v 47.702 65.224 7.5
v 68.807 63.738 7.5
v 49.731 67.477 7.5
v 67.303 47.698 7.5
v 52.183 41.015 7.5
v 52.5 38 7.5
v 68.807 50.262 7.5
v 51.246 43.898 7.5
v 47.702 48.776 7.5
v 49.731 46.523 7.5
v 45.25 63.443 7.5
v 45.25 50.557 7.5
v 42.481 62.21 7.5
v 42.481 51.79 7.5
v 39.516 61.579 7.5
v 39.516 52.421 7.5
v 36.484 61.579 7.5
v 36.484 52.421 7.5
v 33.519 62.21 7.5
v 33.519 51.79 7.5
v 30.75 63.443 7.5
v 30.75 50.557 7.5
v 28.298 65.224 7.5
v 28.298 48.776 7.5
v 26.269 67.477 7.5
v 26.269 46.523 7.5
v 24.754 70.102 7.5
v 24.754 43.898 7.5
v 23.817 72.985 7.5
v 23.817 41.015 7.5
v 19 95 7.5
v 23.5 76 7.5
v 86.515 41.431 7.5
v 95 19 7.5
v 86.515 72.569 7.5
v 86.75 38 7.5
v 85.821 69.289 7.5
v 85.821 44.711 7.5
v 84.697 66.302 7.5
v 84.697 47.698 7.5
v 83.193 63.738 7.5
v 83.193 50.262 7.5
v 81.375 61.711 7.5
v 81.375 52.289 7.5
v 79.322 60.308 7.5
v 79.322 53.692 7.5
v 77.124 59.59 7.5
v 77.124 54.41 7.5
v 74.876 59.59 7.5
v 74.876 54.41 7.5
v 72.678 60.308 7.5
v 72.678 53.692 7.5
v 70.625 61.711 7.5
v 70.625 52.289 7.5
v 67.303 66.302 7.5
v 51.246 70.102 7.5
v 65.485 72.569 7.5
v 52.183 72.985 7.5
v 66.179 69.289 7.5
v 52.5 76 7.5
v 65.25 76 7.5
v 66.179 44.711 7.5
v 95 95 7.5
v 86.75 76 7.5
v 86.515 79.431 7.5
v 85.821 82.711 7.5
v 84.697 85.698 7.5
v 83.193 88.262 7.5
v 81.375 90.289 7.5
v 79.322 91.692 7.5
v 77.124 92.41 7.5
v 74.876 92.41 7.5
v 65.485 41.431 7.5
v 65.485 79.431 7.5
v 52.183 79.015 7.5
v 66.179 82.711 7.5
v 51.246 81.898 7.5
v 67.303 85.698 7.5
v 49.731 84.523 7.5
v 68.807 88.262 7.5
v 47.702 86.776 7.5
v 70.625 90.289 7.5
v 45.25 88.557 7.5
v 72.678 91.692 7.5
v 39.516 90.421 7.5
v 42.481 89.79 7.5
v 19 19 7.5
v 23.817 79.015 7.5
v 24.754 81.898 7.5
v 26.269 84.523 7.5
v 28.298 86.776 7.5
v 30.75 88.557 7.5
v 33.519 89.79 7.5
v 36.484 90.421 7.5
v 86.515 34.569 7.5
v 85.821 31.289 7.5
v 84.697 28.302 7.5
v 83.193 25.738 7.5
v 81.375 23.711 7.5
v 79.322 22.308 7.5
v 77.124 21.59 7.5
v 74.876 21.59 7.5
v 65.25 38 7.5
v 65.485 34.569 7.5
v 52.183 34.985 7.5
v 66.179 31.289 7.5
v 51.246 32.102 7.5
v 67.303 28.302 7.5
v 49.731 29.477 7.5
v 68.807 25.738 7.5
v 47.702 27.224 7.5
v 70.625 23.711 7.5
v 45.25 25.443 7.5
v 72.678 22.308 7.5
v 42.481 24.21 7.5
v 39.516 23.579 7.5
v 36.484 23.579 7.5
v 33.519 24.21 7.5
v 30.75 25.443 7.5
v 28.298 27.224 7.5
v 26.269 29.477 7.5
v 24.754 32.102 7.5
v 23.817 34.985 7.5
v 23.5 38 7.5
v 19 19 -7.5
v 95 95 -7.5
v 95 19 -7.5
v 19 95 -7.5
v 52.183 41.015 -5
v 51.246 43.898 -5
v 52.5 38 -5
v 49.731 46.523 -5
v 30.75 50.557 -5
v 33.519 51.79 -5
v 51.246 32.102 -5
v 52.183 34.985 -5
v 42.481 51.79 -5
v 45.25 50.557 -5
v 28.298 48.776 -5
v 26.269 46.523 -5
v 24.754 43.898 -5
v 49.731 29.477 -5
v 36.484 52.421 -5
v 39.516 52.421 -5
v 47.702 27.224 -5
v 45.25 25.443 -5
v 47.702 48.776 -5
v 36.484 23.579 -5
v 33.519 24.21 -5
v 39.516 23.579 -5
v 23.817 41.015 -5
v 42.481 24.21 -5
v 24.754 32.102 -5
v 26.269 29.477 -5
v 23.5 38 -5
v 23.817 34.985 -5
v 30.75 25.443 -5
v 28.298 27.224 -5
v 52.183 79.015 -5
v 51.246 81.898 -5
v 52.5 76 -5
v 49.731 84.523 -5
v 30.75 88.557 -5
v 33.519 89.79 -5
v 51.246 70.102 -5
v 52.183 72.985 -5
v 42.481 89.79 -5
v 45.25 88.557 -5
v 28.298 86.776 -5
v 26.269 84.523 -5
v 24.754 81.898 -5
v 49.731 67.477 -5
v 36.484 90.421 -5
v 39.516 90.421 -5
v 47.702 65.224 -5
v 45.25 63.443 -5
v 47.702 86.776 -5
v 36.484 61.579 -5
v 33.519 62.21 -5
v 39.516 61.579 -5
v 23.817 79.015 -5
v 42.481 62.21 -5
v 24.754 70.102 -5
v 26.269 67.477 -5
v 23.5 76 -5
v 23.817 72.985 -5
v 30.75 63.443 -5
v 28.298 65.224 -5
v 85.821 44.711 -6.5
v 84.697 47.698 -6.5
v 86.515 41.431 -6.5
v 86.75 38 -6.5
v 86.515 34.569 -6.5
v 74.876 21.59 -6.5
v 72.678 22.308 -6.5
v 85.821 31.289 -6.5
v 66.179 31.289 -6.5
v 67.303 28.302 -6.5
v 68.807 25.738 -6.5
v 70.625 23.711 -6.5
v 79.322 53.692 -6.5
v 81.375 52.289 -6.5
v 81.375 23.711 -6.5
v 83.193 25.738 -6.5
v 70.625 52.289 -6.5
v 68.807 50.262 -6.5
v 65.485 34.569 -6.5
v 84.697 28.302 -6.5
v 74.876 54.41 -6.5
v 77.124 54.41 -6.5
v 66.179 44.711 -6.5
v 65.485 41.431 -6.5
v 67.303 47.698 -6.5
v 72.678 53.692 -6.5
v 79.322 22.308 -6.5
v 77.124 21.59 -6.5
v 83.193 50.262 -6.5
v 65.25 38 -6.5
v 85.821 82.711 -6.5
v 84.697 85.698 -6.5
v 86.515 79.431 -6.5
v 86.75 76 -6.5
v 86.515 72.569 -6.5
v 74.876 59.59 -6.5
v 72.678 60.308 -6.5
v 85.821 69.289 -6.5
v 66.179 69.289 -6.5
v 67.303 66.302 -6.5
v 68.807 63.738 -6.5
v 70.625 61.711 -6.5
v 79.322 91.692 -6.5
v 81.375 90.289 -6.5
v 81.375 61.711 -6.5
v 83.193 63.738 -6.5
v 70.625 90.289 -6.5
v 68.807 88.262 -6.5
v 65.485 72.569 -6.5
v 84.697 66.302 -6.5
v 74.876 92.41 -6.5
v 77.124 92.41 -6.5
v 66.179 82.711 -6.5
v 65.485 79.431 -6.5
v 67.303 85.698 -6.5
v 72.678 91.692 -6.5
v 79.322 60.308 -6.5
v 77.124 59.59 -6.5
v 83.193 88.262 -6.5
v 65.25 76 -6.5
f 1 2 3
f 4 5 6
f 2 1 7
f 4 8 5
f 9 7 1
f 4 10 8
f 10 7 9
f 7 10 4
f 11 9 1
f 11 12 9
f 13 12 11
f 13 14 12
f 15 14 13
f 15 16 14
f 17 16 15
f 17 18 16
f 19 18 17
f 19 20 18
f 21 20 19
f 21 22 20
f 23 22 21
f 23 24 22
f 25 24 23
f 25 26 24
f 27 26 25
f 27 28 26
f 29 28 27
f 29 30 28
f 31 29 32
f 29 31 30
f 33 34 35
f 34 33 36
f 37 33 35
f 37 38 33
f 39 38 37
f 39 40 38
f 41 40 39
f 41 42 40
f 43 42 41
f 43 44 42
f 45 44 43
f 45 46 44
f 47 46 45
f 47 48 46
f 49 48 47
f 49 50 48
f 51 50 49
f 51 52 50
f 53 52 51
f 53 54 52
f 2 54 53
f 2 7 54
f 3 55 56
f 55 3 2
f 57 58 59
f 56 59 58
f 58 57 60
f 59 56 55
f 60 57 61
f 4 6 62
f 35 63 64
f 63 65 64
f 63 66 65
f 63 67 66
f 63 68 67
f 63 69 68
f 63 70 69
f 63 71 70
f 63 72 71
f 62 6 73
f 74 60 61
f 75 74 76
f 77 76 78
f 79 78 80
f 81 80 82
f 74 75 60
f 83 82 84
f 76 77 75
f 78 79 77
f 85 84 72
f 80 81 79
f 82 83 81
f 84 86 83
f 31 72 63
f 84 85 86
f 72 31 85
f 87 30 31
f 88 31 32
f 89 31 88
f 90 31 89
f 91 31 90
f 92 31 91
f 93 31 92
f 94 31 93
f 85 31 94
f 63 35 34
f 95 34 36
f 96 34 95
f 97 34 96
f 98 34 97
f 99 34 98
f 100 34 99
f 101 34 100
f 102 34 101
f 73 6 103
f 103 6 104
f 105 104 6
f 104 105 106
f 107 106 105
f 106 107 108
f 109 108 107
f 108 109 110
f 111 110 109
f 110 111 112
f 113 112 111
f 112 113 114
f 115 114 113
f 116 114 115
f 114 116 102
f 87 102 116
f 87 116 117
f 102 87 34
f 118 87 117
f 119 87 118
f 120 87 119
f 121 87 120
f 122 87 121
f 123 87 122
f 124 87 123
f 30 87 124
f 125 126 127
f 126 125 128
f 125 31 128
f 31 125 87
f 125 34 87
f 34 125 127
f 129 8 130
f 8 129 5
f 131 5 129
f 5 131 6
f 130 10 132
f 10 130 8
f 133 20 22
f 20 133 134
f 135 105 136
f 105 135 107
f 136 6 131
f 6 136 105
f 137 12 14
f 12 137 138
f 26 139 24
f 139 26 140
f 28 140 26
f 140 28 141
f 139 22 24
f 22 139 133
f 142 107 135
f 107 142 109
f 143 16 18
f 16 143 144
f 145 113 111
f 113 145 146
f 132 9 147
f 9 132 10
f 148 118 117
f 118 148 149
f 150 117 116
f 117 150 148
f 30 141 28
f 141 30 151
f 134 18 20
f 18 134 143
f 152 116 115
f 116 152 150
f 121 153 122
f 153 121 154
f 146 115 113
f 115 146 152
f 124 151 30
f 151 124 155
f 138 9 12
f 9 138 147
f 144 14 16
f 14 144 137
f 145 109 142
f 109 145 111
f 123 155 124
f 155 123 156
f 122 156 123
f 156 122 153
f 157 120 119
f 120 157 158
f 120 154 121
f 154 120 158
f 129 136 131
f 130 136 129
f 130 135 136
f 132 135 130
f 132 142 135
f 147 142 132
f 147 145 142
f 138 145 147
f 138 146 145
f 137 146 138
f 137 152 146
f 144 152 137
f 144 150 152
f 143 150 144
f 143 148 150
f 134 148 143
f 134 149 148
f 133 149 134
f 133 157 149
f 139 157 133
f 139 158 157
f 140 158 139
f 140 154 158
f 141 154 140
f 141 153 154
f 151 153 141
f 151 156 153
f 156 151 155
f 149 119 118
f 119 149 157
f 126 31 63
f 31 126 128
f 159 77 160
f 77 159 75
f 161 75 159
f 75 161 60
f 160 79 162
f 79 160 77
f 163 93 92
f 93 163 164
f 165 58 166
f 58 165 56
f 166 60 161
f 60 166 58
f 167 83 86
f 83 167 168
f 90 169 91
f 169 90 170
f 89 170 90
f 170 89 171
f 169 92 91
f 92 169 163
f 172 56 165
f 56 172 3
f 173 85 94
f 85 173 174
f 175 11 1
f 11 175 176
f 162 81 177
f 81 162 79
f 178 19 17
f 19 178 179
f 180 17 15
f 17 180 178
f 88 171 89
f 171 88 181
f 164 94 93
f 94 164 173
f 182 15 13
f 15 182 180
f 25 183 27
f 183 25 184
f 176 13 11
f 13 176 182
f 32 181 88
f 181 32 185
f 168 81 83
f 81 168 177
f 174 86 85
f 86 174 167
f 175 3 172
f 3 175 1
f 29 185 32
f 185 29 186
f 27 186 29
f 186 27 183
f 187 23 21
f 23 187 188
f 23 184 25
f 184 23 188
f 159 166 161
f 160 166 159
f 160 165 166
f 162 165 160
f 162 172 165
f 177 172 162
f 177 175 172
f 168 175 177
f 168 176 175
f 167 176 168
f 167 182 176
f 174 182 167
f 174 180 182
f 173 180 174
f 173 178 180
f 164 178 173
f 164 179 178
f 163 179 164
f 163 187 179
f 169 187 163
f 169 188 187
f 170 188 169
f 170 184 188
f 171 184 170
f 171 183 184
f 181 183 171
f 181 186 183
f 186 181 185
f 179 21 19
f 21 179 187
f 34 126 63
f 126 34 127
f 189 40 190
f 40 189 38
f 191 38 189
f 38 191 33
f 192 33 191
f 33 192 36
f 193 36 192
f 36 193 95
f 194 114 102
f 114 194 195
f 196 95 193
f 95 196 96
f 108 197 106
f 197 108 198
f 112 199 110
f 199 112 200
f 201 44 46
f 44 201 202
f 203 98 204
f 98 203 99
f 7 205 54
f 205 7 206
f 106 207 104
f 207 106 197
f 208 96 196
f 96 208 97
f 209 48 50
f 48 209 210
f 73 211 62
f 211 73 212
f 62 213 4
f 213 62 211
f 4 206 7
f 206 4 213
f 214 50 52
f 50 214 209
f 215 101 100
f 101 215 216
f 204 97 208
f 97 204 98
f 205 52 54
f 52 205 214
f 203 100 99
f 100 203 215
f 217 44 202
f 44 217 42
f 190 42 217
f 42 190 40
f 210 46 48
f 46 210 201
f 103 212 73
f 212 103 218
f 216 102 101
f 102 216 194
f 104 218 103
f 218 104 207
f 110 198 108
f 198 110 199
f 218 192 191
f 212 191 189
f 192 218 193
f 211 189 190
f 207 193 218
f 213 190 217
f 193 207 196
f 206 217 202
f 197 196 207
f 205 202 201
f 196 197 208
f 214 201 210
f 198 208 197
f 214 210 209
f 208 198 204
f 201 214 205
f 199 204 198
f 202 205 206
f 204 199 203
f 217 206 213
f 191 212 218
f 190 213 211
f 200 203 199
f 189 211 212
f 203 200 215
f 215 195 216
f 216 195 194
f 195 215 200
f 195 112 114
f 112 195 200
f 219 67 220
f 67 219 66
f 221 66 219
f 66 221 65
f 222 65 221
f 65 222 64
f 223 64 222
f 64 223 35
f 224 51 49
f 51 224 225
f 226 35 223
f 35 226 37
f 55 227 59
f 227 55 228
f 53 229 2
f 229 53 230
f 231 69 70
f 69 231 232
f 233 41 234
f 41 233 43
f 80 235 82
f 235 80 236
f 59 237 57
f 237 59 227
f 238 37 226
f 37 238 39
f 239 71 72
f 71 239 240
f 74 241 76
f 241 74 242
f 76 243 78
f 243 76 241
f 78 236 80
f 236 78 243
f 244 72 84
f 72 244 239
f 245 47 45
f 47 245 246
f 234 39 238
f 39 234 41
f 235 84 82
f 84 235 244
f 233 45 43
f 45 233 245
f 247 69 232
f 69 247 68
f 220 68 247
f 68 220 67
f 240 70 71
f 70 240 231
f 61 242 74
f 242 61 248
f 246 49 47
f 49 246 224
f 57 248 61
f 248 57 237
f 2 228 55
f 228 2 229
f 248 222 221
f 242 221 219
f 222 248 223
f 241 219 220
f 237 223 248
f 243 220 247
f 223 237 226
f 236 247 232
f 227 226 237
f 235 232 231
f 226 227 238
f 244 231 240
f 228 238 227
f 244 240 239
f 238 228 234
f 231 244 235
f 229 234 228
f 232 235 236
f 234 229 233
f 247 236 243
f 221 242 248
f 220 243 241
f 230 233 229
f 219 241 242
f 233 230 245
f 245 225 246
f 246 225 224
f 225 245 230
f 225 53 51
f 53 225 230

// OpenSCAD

itens_per_line = 2;
z_size = 15;
colorama_lines = [2];
risque_lines   = [1];
num_x = len(colorama_lines) + len(risque_lines);

for(x = [1 : 1 :num_x])
{
    for( y = [1 : 1 : itens_per_line])
    {     
        for ( z = [0 : 1 : len(colorama_lines)])
        {           
            if ( colorama_lines[z] == x )
            {                
                 colorama((38*x),(38*y));              
            }
        }
        
        for ( z = [0 : 1 : len(risque_lines)])
        {           
            if ( risque_lines[z] == x )
            {                
                 risque((38*x),(38*y));
            }
        }
    }
  
}




module colorama(x,y)
{
    translate([x,y,0]){
        difference(){
            translate([0,0,0])
                cube([38,38,z_size],center=true);
            translate([0,0,1])
                oval(21.5,33,z_size,true);
        }
    }   
}

module risque(x,y)
{
      translate([x,y,0]){
        difference(){
            translate([0,0,0])
                cube([38,38,z_size],center=true);
            translate([0,0,10])
                cylinder(30,29/2,29/2,true);
        }
    }   
}
module oval(w,h, height, center = false) { 
    h = h/2;
    w = w/2;
  scale([1, h/w, 1]) cylinder(h=height, r=w, center=center); 
 } 
